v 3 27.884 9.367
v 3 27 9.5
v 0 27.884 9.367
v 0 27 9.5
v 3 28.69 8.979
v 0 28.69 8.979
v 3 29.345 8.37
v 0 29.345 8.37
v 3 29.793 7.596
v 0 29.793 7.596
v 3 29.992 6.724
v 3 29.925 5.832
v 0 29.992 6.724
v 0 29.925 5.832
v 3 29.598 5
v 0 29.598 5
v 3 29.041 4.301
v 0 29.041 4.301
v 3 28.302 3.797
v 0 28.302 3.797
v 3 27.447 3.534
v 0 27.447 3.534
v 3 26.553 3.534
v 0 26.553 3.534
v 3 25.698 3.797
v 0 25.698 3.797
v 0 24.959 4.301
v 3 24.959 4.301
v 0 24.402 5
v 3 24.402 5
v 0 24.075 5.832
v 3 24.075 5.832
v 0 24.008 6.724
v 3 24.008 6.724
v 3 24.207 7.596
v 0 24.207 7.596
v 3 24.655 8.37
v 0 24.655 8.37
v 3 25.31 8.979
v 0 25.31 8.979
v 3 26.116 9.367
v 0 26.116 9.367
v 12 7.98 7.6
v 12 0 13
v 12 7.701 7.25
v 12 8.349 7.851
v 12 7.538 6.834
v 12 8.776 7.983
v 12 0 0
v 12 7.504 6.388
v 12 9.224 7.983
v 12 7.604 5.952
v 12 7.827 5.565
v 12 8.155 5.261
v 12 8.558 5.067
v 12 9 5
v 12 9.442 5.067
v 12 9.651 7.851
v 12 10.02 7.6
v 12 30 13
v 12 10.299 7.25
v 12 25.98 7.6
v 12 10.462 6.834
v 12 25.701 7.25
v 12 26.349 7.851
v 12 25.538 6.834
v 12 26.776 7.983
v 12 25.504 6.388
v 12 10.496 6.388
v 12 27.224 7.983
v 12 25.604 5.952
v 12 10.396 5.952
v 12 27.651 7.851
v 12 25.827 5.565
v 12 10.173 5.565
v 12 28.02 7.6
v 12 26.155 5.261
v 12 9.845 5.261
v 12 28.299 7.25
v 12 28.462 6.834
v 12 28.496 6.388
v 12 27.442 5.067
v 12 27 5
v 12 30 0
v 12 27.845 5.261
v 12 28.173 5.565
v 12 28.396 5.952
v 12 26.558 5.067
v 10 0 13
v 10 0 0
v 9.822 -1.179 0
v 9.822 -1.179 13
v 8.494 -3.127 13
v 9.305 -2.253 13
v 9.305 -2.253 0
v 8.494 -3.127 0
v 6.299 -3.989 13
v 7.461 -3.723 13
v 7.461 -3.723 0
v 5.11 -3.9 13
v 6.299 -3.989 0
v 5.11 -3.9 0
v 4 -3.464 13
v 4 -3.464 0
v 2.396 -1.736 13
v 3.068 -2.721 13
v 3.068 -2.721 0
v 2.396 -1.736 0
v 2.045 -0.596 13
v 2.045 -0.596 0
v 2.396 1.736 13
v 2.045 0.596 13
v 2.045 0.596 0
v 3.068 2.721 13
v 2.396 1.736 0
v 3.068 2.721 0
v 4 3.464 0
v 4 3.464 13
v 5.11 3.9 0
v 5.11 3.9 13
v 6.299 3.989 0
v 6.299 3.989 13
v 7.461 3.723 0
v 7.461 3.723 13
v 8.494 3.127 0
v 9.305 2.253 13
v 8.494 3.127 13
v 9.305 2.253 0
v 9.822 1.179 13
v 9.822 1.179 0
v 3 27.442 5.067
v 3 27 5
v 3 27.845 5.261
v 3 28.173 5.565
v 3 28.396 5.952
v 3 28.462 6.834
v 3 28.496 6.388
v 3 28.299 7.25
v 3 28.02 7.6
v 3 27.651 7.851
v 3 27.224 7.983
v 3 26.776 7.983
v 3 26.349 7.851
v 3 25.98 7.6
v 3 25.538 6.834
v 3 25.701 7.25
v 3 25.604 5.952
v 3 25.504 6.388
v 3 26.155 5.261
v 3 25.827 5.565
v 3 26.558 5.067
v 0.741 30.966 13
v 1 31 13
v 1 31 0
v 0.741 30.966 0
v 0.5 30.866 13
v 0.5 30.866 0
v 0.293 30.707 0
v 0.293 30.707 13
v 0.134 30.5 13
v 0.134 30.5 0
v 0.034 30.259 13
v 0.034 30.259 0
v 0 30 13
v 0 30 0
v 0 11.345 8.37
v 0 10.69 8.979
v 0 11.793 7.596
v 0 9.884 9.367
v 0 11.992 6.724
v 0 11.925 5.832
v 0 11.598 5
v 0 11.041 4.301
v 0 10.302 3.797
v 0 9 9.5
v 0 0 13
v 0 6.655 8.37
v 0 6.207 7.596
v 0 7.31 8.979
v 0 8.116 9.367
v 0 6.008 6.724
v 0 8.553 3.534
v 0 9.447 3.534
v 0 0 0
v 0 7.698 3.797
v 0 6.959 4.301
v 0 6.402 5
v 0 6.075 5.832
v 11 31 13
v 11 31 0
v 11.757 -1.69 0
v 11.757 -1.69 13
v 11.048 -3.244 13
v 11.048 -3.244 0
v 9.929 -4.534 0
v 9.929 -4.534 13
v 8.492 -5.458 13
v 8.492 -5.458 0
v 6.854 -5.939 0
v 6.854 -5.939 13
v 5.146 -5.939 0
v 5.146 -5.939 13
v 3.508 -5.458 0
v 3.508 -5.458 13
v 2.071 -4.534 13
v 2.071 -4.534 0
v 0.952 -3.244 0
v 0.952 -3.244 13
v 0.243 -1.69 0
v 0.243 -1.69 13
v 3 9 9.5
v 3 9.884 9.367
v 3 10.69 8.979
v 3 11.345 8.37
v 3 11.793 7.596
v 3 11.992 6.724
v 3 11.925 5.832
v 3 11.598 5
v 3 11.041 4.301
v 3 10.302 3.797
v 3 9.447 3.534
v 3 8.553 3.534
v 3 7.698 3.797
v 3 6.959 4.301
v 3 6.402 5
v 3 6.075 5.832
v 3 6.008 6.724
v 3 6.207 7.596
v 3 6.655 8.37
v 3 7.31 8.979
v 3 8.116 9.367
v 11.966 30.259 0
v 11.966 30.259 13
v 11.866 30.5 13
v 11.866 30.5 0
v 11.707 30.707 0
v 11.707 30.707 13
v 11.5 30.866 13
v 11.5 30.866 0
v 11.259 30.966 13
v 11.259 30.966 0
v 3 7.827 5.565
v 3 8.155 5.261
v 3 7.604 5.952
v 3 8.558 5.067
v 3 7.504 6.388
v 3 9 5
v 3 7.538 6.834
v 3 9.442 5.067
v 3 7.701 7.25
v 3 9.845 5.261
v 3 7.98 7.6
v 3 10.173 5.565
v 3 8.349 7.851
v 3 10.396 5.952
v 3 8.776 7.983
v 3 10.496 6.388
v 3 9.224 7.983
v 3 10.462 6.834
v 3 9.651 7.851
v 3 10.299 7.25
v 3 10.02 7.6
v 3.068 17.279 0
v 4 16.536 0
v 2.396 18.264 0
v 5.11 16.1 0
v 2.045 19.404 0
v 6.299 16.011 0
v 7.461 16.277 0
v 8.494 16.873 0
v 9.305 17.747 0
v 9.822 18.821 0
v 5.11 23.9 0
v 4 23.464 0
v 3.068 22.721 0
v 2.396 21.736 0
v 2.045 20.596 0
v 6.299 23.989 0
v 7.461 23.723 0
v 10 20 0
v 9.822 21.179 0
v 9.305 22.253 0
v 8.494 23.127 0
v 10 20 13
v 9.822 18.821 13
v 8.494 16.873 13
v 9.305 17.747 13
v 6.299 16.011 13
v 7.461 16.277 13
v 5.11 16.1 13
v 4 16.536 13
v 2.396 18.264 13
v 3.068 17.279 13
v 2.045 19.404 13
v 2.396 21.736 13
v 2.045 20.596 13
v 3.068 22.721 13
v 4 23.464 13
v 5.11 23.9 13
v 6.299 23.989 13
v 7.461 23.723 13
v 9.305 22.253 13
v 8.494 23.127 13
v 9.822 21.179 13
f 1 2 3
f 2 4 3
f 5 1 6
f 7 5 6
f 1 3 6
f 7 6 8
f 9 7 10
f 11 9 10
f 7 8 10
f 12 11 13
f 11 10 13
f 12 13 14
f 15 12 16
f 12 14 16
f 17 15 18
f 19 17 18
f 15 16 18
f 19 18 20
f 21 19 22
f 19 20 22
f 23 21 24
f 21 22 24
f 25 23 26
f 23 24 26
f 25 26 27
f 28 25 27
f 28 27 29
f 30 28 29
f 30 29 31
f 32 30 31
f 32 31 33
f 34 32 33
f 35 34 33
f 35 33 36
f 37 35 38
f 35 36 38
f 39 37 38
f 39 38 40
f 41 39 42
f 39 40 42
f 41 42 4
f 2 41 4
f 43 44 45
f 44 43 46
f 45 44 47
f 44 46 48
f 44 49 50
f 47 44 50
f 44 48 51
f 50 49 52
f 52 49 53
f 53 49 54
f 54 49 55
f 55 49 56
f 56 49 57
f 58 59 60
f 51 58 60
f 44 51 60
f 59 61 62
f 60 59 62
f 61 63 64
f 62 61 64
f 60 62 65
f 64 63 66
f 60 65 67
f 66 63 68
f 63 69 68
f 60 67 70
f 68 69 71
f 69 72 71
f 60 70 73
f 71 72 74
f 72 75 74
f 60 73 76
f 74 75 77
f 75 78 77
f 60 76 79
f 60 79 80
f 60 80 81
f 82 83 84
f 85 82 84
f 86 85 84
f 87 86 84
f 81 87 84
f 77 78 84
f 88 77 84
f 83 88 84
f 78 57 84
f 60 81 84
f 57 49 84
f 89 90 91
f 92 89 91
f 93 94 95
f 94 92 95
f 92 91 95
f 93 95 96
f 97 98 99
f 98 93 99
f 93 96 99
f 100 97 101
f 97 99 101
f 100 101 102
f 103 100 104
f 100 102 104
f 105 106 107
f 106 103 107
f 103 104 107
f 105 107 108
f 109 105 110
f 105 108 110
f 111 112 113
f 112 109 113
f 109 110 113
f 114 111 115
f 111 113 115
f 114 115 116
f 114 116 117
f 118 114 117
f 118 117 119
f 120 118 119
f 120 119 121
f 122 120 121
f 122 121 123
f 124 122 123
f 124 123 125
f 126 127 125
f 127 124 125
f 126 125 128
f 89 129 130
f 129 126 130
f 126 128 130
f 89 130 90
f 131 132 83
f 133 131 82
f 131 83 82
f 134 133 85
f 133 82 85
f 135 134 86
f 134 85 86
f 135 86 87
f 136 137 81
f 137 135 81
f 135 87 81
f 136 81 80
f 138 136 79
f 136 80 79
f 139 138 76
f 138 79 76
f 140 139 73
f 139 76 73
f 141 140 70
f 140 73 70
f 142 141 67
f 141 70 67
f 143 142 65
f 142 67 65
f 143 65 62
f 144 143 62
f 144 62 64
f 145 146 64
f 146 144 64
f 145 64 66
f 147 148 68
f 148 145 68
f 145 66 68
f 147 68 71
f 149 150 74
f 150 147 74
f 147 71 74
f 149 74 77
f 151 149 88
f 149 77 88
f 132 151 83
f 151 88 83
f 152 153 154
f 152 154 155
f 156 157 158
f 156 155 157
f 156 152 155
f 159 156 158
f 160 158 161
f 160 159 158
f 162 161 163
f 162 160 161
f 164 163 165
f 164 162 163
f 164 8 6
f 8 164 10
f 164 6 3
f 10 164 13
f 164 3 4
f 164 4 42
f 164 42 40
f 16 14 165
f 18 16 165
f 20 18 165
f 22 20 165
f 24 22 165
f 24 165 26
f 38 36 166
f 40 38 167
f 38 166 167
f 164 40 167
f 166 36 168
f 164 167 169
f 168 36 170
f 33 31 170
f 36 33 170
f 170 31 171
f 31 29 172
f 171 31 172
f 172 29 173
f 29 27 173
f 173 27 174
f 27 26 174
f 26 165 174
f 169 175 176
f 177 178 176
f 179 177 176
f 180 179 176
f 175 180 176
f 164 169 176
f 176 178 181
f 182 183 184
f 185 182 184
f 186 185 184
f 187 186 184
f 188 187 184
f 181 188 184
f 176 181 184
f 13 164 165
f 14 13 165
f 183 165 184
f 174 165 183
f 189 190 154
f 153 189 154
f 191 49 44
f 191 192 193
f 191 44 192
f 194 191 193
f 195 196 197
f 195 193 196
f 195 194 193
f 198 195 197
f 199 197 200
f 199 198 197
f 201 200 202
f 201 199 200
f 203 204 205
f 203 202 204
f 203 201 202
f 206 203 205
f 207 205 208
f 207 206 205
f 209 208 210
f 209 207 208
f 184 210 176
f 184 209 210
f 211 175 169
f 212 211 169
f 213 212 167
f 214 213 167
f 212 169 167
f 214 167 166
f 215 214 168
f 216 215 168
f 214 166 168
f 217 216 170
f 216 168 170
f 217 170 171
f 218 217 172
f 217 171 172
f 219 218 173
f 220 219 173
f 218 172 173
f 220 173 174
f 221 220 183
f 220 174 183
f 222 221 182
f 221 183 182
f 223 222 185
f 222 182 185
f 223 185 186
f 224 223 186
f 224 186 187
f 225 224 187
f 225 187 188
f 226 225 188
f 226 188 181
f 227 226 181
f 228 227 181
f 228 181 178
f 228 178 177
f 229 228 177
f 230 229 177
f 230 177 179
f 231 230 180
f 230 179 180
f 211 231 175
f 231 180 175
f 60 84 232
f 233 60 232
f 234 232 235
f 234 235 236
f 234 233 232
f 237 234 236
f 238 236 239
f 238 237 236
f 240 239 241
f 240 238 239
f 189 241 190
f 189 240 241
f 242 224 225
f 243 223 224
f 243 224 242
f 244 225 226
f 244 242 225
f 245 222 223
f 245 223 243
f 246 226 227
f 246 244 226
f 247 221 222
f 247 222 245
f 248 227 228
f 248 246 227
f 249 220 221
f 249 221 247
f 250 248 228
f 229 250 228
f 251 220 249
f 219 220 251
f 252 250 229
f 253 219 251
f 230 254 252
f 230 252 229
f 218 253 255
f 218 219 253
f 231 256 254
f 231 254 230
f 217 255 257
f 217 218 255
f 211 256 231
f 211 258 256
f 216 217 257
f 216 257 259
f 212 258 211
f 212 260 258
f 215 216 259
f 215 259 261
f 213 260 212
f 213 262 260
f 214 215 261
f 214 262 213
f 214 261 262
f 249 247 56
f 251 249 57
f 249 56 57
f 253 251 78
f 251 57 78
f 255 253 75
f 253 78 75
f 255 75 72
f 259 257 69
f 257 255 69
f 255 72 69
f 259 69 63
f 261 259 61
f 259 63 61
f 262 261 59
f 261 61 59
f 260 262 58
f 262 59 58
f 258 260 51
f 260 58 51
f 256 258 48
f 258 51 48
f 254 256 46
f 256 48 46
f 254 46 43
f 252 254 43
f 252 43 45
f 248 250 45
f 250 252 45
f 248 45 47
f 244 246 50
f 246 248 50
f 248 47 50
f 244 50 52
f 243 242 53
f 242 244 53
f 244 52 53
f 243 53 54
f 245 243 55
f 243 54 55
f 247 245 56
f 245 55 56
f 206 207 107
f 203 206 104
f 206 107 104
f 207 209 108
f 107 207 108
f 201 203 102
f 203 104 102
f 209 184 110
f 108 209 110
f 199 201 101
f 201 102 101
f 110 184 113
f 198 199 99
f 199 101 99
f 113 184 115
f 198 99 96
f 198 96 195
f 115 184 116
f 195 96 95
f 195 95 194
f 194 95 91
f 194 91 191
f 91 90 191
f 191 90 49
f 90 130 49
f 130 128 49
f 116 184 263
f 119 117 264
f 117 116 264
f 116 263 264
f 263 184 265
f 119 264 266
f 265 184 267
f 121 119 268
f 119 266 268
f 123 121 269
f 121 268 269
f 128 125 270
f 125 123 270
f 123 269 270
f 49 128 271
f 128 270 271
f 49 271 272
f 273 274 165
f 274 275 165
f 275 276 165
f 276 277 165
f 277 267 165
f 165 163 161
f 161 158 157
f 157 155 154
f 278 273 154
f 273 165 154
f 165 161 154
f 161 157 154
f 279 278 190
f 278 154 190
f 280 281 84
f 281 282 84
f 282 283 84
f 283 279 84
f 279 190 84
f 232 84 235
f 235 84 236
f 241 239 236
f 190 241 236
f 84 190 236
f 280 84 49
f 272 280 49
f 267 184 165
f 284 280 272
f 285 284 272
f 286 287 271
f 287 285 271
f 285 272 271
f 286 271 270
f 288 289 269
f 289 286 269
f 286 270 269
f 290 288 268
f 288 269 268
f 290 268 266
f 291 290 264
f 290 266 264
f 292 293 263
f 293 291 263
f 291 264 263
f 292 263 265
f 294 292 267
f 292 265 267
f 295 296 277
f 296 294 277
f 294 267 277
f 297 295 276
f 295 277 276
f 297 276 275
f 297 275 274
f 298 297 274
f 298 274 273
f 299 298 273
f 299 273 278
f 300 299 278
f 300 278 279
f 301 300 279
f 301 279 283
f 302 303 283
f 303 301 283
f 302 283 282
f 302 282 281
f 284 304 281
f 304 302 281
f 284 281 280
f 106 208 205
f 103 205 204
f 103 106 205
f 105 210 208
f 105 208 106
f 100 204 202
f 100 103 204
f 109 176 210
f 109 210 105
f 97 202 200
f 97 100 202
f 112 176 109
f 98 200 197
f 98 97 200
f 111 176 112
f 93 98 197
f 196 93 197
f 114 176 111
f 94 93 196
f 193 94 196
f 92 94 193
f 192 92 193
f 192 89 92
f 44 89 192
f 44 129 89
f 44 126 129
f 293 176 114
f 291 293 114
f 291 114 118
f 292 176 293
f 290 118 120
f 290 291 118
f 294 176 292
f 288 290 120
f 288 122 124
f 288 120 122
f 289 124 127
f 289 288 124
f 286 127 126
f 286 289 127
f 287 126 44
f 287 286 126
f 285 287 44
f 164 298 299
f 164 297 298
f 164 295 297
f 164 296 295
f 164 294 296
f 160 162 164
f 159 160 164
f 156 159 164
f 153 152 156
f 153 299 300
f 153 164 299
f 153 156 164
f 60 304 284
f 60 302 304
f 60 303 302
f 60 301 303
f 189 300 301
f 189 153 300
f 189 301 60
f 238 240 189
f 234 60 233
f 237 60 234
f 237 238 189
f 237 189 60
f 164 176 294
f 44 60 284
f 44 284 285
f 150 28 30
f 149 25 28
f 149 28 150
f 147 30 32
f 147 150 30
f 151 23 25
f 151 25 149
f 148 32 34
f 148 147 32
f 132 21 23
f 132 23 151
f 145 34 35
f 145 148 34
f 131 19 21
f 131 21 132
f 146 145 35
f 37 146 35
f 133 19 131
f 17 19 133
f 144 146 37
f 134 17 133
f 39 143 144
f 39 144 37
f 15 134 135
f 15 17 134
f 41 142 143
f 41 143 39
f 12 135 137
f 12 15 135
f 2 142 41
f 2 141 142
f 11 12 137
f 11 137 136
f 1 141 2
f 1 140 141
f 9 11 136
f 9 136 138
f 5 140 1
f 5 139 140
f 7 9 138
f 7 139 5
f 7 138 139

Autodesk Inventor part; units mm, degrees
ref_plane "YZ Plane" through (0, 0, 0) normal (1, 0, 0) x (0, 1, 0)
ref_plane "XZ Plane" through (0, 0, 0) normal (0, 1, 0) x (-1, 0, 0)
ref_plane "XY Plane" through (0, 0, 0) normal (0, 0, 1) x (1, 0, 0)
sketch "Sketch1" plane through (0, 0, 0) normal (0, 0, 1) x (1, 0, 0)
  line L0 (0, 0) -> (12, 0) construction
  line L1 (12, 0) -> (12, 25)
  line L2 (12, 25) -> (0, 25) construction
  line L3 (0, 25) -> (0, 0)
  arc A0 (12, 25) -> (0, 25) centre (6, 25) ccw
  arc A1 (0, 0) -> (12, 0) centre (6, 0) ccw
  circle A2 centre (6, 0) radius 4
  circle A3 centre (6, 20) radius 4
  line L4 (0, 25) -> (12, 25)
  line L5 (12, 25) -> (12, 31)
  line L6 (12, 31) -> (0, 31)
  line L7 (0, 31) -> (0, 25)
  dimension "d0" = 12
  dimension "d1" = 25
  dimension "d3" = 8
  dimension "d16" = 8
  dimension "d17" = 20
extrude "Extrusion1" add sketch "Sketch1" along normal blind 13
sketch "Sketch2" plane through (12, 0, 0) normal (1, 0, 0) x (0, 0, -1)
  circle A0 centre (-6.5, 27) radius 1.5
  circle A1 centre (-6.5, 9) radius 1.5
  line L0 (0, 0) -> (-13, 0) projected
  point P0 (-6.5, 0)
  dimension "d6" = 3
  dimension "d7" = 3
  dimension "d8" = 18
  dimension "d9" = 9
extrude "Extrusion2" cut sketch "Sketch2" against normal through all
sketch "Sketch3" plane through (0, 0, 0) normal (-1, 0, 0) x (0, 0, 1)
  circle A0 centre (6.5, 27) radius 1.5 projected
  circle A1 centre (6.5, 9) radius 1.5 projected
  circle A2 centre (6.5, 27) radius 3
  circle A3 centre (6.5, 9) radius 3
  point P0 (0, 0)
  dimension "d12" = 6
  dimension "d13" = 6
extrude "Extrusion3" cut sketch "Sketch3" against normal blind 3
fillet "Fillet1" radius 1 2 edges at (0, 31, 6.5) (12, 31, 6.5)
properties part number "z axis arm3"
